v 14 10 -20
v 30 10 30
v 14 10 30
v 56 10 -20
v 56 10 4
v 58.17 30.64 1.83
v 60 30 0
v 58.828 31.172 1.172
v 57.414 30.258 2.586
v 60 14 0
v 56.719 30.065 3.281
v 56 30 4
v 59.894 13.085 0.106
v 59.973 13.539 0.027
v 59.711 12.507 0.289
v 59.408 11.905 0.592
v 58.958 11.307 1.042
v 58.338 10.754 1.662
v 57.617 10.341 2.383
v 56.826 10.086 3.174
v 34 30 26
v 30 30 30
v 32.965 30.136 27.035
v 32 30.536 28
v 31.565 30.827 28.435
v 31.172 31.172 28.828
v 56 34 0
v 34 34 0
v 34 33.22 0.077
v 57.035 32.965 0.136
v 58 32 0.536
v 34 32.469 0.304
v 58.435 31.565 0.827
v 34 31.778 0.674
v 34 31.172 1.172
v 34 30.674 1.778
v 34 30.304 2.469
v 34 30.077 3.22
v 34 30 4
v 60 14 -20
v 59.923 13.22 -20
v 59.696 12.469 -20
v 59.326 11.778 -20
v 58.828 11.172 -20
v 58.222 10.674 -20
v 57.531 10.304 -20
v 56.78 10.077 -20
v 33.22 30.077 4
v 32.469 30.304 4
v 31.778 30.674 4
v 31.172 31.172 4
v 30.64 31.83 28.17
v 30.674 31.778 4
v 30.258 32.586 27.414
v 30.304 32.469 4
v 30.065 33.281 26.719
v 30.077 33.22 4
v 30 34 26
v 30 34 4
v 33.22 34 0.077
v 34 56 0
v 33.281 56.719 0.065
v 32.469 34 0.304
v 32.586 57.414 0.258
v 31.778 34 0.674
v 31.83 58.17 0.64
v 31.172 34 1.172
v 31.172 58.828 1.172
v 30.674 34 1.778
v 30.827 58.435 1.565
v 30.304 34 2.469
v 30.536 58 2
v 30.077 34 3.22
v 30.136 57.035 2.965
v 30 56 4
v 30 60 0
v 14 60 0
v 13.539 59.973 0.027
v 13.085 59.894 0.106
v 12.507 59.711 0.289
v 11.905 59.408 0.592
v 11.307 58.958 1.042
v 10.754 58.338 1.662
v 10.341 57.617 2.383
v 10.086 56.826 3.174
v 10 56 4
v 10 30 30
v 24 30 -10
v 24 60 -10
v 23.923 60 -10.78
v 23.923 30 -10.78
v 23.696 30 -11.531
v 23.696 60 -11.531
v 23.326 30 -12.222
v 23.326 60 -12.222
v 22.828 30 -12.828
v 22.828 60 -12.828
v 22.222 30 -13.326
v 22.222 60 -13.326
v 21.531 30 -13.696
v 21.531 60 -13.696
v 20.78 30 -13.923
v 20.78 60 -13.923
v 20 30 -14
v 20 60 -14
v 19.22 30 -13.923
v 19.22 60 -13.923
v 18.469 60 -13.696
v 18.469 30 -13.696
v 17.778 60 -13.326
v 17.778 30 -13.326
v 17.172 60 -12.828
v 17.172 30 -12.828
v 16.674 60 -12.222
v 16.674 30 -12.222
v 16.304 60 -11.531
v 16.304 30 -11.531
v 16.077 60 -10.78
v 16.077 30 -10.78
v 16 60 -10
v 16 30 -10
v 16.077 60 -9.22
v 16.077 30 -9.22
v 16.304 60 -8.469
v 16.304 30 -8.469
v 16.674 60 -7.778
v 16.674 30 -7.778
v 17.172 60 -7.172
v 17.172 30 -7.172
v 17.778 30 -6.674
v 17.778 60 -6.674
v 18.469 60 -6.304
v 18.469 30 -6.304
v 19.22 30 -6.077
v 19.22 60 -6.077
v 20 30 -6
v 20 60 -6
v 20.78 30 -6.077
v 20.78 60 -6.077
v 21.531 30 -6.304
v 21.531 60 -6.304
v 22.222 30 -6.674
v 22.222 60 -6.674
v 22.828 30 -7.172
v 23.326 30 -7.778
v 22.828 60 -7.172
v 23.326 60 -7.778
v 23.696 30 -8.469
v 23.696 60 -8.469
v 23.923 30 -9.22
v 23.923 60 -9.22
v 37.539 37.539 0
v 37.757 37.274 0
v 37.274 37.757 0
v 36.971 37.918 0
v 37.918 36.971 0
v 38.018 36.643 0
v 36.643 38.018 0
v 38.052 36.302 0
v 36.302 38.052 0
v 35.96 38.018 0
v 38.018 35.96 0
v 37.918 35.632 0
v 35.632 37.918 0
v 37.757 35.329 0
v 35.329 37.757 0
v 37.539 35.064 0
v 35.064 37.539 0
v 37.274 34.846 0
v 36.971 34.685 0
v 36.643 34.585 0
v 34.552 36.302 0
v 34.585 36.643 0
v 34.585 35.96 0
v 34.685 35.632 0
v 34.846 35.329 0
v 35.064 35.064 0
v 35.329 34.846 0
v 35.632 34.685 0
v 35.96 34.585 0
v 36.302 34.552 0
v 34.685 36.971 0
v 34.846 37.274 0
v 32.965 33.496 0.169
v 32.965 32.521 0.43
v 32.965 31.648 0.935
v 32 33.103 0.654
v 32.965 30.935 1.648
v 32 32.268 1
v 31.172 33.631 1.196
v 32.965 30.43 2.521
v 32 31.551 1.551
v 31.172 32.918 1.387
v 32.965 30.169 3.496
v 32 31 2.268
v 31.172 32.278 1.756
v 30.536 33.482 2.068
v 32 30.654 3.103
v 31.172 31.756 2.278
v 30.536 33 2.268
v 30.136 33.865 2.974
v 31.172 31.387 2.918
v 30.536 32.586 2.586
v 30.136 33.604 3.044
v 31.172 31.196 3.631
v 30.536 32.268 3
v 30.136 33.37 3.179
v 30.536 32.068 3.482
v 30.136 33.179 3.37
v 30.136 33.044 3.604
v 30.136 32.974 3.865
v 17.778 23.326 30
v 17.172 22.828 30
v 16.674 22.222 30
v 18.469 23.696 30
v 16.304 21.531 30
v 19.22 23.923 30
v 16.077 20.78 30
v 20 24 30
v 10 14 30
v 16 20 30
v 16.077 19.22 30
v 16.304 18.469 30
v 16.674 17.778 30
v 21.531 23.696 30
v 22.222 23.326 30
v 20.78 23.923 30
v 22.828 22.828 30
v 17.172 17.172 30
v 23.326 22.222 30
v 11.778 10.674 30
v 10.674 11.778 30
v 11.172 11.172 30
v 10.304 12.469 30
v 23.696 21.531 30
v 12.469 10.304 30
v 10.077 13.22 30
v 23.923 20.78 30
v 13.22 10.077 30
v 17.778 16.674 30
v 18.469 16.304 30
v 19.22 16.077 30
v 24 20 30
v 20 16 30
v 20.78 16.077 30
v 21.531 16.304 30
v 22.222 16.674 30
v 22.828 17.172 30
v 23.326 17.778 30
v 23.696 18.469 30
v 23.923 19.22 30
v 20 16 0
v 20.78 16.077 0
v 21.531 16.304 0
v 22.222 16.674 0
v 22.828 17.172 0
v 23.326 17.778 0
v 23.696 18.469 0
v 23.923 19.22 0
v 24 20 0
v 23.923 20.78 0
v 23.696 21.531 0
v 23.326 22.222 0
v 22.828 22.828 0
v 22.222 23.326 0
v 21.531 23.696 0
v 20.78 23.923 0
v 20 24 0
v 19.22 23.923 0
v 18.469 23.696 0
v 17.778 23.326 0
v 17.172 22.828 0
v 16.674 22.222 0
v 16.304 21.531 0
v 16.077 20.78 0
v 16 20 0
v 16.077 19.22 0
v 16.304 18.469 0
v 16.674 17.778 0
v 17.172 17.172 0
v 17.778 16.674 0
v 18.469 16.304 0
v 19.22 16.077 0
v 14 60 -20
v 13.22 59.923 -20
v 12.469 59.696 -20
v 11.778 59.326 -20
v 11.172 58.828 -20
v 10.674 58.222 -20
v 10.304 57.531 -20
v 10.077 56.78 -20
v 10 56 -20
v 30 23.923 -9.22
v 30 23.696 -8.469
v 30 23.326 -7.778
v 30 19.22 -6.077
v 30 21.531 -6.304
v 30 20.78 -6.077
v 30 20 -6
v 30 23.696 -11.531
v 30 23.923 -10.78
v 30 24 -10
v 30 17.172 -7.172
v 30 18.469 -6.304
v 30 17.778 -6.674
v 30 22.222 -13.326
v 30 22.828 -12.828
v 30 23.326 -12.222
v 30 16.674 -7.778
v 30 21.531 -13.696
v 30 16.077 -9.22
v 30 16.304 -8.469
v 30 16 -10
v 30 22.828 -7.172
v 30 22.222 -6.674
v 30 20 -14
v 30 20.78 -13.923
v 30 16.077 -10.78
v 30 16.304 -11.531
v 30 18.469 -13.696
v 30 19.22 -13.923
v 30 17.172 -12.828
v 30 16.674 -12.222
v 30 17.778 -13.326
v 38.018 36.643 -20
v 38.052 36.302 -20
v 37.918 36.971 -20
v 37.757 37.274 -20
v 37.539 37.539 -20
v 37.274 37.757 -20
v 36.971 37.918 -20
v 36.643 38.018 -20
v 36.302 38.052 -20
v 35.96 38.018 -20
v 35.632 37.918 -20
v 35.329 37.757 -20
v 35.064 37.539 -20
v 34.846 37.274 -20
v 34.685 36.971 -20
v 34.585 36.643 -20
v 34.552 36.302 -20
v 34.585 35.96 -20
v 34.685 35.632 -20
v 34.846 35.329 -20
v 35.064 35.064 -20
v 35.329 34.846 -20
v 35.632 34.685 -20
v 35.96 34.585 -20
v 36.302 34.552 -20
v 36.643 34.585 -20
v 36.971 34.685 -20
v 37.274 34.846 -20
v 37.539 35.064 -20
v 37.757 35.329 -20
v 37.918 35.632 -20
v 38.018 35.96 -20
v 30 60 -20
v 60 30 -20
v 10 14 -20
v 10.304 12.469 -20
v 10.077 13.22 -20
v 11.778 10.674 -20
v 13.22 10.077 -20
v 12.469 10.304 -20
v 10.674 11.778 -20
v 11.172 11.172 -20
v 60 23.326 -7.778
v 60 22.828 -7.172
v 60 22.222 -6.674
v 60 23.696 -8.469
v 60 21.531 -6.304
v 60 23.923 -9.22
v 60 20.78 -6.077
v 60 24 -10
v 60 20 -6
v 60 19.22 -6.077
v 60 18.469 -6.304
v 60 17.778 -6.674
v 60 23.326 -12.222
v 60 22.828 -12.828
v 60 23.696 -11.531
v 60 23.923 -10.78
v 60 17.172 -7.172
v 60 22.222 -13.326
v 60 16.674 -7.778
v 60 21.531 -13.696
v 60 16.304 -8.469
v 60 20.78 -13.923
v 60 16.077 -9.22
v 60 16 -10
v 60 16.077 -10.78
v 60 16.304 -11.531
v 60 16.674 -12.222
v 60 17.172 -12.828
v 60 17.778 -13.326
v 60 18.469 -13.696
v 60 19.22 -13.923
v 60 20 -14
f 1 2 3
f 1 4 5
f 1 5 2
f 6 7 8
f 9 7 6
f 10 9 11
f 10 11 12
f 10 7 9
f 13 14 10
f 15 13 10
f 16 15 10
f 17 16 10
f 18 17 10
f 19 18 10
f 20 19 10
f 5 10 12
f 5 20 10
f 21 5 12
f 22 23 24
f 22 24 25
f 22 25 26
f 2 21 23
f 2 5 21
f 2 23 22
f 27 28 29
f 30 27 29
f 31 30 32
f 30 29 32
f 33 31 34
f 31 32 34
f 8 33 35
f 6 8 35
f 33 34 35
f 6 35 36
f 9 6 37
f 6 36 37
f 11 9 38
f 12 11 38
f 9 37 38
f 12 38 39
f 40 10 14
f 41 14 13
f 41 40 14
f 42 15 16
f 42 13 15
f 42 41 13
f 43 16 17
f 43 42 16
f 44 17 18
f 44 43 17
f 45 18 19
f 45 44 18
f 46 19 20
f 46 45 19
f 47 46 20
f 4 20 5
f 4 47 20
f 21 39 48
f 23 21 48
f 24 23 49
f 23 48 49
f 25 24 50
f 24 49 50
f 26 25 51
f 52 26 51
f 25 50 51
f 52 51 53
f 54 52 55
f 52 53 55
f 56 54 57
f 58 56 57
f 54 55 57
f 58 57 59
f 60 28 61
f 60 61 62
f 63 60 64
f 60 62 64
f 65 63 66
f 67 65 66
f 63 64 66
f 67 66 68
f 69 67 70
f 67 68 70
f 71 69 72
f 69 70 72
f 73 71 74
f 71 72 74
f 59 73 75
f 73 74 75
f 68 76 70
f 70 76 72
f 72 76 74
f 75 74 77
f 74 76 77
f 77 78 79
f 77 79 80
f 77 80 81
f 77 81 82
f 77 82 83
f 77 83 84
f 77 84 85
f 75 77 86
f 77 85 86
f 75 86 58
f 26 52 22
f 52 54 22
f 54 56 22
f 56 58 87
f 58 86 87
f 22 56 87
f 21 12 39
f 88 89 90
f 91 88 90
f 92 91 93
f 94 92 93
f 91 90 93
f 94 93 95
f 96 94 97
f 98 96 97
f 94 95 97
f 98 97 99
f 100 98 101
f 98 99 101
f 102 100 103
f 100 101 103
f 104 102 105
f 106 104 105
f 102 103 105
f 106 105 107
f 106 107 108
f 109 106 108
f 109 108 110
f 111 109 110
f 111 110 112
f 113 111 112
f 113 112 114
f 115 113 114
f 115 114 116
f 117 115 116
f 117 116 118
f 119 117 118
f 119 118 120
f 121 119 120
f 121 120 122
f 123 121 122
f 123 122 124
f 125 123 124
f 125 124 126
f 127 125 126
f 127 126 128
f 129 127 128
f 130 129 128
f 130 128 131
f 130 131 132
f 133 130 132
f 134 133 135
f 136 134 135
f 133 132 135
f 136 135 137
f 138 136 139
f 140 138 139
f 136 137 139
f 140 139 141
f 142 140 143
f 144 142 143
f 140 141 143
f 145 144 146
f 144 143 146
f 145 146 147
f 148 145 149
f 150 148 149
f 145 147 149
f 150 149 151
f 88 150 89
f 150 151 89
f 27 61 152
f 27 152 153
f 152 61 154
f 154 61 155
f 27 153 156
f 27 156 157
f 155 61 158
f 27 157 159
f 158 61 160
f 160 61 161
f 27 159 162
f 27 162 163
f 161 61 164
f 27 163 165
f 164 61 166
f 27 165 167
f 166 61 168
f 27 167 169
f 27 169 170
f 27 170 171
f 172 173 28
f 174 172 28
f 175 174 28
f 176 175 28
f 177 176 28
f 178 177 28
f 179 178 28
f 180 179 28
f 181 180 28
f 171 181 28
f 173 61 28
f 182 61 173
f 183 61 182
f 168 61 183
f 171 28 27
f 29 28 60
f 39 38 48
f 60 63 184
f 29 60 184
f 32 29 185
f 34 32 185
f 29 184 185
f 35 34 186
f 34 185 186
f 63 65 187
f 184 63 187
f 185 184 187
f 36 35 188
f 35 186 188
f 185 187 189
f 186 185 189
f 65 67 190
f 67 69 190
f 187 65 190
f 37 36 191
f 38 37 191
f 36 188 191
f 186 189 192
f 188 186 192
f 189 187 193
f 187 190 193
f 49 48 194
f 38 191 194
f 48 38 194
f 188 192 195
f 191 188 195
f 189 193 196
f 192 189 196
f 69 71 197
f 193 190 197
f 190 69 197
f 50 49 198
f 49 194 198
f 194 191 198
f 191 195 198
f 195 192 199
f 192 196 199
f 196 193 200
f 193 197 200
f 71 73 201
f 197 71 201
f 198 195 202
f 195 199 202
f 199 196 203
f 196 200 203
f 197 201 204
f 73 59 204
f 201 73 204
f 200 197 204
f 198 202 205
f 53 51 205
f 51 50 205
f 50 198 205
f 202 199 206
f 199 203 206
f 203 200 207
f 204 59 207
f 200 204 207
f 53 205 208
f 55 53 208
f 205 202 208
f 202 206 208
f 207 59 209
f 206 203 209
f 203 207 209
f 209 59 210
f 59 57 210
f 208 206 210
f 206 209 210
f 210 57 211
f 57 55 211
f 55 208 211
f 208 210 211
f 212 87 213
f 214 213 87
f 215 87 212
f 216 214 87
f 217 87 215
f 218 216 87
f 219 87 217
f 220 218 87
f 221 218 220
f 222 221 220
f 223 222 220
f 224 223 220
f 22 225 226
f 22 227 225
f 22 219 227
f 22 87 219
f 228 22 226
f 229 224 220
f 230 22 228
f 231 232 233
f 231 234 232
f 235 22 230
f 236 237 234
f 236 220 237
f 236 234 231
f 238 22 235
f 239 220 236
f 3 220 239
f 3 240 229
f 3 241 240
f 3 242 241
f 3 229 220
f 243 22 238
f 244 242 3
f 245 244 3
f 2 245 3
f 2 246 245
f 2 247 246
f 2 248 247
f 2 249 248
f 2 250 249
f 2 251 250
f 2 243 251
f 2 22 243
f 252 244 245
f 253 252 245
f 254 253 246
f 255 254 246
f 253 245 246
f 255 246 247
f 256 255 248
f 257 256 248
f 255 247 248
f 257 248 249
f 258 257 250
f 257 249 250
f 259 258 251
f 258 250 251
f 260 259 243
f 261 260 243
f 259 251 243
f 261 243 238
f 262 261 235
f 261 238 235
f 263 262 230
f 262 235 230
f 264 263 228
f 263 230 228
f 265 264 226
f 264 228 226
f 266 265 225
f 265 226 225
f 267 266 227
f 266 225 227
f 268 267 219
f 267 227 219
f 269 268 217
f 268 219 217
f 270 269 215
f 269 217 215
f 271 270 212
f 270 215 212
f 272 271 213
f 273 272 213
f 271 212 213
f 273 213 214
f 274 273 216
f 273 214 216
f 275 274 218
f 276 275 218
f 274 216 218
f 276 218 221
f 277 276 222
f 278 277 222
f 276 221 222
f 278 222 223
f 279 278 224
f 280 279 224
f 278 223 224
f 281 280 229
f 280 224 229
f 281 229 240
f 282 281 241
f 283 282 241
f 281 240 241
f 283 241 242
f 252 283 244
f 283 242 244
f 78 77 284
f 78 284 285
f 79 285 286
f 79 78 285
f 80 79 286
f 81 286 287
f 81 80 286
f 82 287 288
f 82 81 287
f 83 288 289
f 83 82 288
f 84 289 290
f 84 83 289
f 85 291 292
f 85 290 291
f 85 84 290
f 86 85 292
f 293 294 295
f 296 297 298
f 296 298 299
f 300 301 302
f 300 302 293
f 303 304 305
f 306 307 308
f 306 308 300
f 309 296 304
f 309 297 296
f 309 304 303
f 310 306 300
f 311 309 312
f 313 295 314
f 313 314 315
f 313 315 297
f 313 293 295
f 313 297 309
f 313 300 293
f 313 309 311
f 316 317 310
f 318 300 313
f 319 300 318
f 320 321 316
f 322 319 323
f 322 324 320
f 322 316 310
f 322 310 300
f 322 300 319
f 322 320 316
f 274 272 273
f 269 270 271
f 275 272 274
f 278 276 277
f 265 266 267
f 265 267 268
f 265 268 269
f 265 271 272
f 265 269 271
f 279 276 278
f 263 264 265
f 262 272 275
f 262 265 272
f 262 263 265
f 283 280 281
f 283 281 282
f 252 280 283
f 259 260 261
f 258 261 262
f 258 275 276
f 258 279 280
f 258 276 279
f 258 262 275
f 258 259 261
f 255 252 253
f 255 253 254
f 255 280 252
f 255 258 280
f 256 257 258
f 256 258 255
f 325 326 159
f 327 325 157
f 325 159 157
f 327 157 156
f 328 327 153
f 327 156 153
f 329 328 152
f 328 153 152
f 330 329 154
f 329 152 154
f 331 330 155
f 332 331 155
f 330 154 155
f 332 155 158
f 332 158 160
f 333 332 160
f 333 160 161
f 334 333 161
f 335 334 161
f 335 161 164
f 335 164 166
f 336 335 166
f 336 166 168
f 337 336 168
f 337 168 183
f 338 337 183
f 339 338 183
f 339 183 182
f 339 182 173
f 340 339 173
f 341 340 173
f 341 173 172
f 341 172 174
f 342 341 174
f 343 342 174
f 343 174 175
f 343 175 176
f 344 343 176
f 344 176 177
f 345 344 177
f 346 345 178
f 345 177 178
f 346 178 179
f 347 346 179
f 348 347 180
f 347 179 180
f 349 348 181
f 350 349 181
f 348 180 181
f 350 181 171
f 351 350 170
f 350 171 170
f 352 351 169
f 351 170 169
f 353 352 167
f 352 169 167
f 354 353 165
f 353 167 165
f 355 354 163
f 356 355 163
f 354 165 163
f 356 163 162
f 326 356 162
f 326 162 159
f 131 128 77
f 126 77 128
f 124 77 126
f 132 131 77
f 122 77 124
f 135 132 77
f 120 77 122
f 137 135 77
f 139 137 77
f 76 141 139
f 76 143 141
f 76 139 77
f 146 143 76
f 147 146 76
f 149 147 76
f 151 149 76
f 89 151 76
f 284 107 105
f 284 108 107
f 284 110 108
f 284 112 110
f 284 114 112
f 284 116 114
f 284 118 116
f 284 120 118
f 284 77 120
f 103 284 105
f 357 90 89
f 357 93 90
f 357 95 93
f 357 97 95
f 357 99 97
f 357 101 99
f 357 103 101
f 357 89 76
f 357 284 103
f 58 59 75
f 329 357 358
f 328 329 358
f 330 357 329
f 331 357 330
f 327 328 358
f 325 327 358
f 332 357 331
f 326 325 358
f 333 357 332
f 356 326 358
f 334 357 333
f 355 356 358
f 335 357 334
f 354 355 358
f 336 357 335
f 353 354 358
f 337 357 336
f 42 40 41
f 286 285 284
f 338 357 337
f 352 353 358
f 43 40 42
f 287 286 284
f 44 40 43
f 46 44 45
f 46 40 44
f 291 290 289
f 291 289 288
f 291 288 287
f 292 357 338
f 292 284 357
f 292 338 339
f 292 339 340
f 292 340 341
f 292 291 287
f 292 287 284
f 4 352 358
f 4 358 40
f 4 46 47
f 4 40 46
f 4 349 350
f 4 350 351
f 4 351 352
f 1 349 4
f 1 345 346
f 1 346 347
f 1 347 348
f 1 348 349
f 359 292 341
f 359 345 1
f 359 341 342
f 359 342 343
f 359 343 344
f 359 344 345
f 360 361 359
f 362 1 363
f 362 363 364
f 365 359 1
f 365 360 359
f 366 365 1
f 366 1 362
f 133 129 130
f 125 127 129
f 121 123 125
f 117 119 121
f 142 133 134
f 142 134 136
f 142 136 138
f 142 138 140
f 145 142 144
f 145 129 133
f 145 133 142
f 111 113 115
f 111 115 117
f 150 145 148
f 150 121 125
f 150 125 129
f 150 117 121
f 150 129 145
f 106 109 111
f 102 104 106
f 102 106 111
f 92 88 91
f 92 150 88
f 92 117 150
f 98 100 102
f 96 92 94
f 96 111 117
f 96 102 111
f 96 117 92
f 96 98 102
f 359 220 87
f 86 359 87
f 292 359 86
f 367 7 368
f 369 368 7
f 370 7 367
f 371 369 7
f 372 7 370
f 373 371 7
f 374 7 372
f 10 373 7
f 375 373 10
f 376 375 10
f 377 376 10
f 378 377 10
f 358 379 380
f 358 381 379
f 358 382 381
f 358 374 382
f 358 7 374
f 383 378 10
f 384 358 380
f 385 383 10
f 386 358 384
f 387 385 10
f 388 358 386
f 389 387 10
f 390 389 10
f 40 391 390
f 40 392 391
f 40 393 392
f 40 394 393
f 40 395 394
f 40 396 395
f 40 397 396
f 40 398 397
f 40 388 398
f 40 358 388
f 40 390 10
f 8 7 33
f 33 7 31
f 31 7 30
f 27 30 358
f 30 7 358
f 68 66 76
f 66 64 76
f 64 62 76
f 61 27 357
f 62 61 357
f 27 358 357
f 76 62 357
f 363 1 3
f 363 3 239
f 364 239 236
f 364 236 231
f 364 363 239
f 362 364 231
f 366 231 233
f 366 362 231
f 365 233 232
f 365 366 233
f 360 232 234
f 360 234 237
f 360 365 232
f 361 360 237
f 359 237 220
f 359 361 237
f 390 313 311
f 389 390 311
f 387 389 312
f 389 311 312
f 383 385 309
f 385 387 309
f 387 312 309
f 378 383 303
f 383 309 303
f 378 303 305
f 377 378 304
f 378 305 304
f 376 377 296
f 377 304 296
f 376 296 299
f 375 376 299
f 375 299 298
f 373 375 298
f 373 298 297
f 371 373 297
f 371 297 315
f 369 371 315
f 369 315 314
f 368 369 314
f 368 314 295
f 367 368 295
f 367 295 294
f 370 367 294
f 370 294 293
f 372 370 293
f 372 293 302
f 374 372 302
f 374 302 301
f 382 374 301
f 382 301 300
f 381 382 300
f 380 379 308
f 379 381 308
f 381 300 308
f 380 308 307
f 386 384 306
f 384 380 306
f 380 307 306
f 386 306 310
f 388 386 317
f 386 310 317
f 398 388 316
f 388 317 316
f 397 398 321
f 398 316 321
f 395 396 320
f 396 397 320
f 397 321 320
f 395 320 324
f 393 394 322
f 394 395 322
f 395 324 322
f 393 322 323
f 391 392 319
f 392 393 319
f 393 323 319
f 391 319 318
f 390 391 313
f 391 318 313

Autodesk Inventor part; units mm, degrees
ref_plane "YZ Plane" through (0, 0, 0) normal (1, 0, 0) x (0, 1, 0)
ref_plane "XZ Plane" through (0, 0, 0) normal (0, 1, 0) x (-1, 0, 0)
ref_plane "XY Plane" through (0, 0, 0) normal (0, 0, 1) x (1, 0, 0)
sketch "Sketch1" plane through (0, 0, 0) normal (0, 0, 1) x (1, 0, 0)
  circle A0 centre (0, 0) radius 4
  line L0 (-10, -10) -> (10, -10)
  line L1 (10, -10) -> (10, 10)
  line L2 (10, 10) -> (-10, 10)
  line L3 (-10, 10) -> (-10, -10)
  line L4 (-10, -10) -> (10, 10) construction
  line L5 (10, -10) -> (-10, 10) construction
  dimension "d0" = 8
  dimension "d3" = 20
  dimension "d4" = 10
  dimension "d5" = 10
extrude "Extrusion1" add sketch "Sketch1" along normal blind 30 and the other way blind 20
extrude "Extrusion2" add sketch "Sketch1" against normal up to surface (20 mm away) contours A0
sketch "Sketch2" plane through (-10, -10, 30) normal (-1, 0, 0) x (0, 0, 1)
  line L0 (-50, 20) -> (-50, 0) projected
  line L1 (-50, 20) -> (-30, 20)
  line L2 (-30, 20) -> (-30, 0)
  line L3 (-30, 0) -> (-50, 0)
  line L4 (-50, 0) -> (-50, 20)
  point P0 (-30, 10)
extrude "Extrusion3" add sketch "Sketch2" along normal blind 30
sketch "Sketch3" plane through (-10, -10, 30) normal (0, -1, 0) x (1, 0, 0)
  line L0 (0, -30) -> (-30, -30) projected
  line L1 (0, -30) -> (20, -30)
  line L2 (20, -30) -> (20, -50)
  line L3 (20, -50) -> (0, -50)
  line L4 (0, -50) -> (0, -30)
  point P0 (10, -30)
extrude "Extrusion4" add sketch "Sketch3" along normal blind 30
sketch "Sketch4" plane through (-40, -10, 30) normal (-1, 0, 0) x (0, 0, 1)
  circle A0 centre (-40, 10) radius 4
  point P0 (-30, 10)
  dimension "d16" = 8
extrude "Extrusion5" cut sketch "Sketch4" against normal blind 30
sketch "Sketch5" plane through (-10, -40, 30) normal (0, -1, 0) x (1, 0, 0)
  circle A0 centre (10, -40) radius 4
  point P0 (10, -30)
  dimension "d19" = 8
extrude "Extrusion6" cut sketch "Sketch5" against normal blind 30
sketch "Sketch6" plane through (0, 0, -20) normal (0, 0, -1) x (-1, 0, 0)
  line L0 (10, -10) -> (40, -10) projected
  line L1 (10, -10) -> (10, -40) projected
  line L2 (10, -40) -> (-10, -40) projected
  line L3 (40, -10) -> (10, -40)
  point P0 (0, 0)
extrude "Extrusion7" add sketch "Sketch6" against normal blind 20
sketch "Sketch7" plane through (-10, 10, 30) normal (0, 1, 0) x (1, 0, 0)
  line L0 (-30, 30) -> (-30, 50) projected
  line L1 (0, 30) -> (-30, 30) projected
  line L2 (-30, 30) -> (0, 30)
  line L3 (0, 0) -> (20, 0) projected
  line L4 (0, 30) -> (0, 0)
  line L5 (0, 0) -> (-30, 30)
  point P0 (10, 30)
extrude "Extrusion8" add sketch "Sketch7" against normal blind 20
sketch "Sketch8" plane through (10, -10, 30) normal (1, 0, 0) x (0, 0, -1)
  line L0 (30, 0) -> (0, 0) projected
  line L1 (30, 0) -> (30, -30) projected
  line L2 (0, 20) -> (0, 0) projected
  line L3 (0, 0) -> (30, -30)
  point P0 (30, 10)
extrude "Extrusion9" add sketch "Sketch8" against normal blind 20
sketch "Sketch9" plane through (10, 10, 30) normal (0, 1, 0) x (1, 0, 0)
  line L0 (-50, 36) -> (-20, 36) projected
  line L1 (-14, 30) -> (-14, 0) projected
  circle A0 centre (-26.3015, 23.6985) radius 12.3015
  line L2 (-50, 30) -> (-20, 0) projected
  point P0 (-10, 30)
hole "Hole1" at (-16.3015, 10, 6.3015) direction (0, -1, 0) diameter 3.5 end through all
fillet "Fillet1" radius 4 3 edges at (-10, -25, 0) (-10, -10, 15) (-25, -10, 0)
fillet "Fillet2" radius 4 1 edges at (10, -15, -20)
fillet "Fillet3" radius 4 2 edges at (10, 0, 30) (-40, 0, -20)
move or copy body "Move Body1" bodies to move or copy 1 copy no rotation origin (0, 0, 0) rotation axis (-0.5773503, 0.5773503, -0.5773503) rotation angle 120 translate (30, 20, -10)
properties part number "connector" material "ABS Plastic"
